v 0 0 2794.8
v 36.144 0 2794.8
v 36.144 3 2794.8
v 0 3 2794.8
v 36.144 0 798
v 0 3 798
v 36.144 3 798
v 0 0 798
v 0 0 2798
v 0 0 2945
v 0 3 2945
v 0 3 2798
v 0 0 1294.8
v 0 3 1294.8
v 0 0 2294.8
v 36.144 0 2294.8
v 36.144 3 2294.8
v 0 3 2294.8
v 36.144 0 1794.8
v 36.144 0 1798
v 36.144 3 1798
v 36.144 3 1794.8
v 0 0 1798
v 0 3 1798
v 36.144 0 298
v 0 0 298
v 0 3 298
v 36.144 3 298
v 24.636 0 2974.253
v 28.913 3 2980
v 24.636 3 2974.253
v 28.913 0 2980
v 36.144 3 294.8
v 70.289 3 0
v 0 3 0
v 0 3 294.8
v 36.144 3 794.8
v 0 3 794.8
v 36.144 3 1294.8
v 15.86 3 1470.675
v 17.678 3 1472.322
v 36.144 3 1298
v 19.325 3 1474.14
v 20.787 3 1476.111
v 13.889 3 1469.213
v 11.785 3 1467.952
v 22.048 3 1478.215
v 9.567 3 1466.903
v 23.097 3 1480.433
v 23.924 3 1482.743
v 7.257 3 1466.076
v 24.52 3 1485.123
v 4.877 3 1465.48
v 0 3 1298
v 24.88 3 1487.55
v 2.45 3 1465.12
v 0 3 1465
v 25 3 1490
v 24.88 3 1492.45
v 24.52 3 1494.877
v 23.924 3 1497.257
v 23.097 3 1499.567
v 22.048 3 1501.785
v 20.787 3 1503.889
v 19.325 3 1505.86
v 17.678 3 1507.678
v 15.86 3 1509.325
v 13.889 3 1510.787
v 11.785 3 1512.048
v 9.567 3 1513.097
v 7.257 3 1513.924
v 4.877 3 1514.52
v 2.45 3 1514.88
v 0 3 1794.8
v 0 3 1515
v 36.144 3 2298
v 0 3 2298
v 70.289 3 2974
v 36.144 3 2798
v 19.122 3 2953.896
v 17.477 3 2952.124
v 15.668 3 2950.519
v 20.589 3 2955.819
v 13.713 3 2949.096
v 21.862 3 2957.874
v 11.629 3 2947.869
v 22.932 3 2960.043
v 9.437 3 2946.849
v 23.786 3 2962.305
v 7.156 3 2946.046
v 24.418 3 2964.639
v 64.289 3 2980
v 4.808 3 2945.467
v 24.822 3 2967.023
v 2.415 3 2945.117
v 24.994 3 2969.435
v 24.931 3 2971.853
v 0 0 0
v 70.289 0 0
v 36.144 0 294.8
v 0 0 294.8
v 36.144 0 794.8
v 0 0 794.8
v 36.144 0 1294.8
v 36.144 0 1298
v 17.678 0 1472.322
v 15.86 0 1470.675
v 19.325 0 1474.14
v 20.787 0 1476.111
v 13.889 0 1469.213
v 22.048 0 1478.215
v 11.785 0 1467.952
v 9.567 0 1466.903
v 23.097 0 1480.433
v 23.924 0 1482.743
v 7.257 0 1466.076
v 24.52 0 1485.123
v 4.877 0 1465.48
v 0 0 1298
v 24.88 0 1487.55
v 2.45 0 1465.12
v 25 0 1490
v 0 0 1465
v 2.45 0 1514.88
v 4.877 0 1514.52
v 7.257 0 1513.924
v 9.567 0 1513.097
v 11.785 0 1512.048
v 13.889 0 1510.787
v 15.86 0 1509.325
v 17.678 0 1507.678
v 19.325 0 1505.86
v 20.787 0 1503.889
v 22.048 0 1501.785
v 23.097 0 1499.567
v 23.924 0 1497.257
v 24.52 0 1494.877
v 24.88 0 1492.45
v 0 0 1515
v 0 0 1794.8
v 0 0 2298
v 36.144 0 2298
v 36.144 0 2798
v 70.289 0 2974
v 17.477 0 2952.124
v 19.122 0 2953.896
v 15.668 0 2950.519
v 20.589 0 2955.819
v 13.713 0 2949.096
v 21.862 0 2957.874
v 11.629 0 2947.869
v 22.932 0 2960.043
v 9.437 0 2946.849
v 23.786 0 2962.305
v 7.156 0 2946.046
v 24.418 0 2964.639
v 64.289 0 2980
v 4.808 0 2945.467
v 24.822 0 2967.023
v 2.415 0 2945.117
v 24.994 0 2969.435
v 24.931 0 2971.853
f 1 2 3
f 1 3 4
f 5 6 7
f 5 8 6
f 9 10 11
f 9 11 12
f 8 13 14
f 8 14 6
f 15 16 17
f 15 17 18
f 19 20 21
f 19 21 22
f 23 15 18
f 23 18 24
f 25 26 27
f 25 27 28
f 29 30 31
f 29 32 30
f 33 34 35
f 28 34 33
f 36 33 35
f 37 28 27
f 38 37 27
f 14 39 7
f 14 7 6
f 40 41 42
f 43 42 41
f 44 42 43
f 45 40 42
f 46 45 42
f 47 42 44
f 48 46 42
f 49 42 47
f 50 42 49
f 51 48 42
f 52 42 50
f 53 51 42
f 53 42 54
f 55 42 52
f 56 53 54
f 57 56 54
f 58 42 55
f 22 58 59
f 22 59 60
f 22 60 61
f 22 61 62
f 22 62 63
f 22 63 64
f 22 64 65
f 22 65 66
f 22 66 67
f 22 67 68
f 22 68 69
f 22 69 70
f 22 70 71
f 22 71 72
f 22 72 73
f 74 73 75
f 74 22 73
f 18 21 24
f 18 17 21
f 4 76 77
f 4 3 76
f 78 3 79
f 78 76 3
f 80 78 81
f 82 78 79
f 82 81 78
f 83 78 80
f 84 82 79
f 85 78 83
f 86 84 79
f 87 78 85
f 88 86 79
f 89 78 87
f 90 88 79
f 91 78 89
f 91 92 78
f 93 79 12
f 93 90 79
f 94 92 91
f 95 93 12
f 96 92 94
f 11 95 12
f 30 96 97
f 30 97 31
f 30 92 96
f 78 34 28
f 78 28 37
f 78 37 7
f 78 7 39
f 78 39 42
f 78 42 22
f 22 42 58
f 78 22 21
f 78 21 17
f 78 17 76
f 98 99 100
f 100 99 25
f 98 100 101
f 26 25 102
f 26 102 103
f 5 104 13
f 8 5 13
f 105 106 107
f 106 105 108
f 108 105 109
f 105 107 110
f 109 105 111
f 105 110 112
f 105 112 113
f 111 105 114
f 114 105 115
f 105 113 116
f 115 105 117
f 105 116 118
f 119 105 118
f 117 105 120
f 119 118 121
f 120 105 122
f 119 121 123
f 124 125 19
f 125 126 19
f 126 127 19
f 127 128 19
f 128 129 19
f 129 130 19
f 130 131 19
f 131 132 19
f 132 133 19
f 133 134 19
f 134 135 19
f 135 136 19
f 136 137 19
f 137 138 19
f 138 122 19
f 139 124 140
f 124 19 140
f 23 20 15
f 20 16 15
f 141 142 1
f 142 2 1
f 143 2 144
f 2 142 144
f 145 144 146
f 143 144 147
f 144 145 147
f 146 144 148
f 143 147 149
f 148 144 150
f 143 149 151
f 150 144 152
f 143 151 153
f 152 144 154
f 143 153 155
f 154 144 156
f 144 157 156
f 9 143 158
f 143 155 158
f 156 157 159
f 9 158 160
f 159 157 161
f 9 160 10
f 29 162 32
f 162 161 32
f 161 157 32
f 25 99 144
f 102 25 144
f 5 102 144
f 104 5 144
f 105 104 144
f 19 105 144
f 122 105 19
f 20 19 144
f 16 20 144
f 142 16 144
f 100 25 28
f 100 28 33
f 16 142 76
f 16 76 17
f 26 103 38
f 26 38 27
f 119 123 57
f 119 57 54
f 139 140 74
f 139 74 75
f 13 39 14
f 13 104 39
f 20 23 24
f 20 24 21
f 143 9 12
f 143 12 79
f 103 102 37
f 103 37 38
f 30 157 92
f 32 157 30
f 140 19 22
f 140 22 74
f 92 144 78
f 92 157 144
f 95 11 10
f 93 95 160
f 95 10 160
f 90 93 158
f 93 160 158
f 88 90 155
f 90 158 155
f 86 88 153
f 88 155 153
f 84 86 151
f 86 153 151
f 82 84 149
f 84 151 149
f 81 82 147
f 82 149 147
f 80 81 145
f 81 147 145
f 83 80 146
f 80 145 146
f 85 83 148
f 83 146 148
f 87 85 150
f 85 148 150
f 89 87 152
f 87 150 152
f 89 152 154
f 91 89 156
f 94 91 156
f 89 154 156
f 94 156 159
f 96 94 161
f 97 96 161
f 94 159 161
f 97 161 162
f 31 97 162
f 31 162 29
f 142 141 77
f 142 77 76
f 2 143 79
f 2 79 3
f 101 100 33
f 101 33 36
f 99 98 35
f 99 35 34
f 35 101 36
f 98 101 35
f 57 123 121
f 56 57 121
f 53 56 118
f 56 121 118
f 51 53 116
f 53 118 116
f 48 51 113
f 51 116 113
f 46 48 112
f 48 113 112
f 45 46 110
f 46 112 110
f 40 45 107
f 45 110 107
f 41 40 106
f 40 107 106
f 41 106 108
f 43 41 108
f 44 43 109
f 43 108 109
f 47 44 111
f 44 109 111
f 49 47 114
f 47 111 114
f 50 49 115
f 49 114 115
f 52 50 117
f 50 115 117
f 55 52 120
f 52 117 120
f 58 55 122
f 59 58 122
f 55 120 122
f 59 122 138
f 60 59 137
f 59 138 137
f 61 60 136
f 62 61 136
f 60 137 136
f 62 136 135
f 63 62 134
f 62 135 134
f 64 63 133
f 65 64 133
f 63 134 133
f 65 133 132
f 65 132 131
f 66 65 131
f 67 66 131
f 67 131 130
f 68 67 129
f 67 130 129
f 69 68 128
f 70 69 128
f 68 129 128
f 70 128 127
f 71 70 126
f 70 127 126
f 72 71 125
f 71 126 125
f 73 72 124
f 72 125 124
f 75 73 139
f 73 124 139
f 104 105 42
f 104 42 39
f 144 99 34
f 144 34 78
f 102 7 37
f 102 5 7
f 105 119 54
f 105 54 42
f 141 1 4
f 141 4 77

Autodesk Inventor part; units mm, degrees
ref_plane "YZ Plane" through (0, 0, 0) normal (1, 0, 0) x (0, 1, 0)
ref_plane "XZ Plane" through (0, 0, 0) normal (0, 1, 0) x (-1, 0, 0)
ref_plane "XY Plane" through (0, 0, 0) normal (0, 0, 1) x (1, 0, 0)
sketch "Sketch6" plane through (0, 0, 0) normal (0, 1, 0) x (-1, 0, 0)
  line L0 (0, 0) -> (-70.2891, 0)
  line L1 (-70.2891, 0) -> (-70.2891, 2980)
  line L2 (-70.2891, 2980) -> (0, 2980)
  line L3 (0, 2980) -> (0, 0)
  dimension "d26" = 70.2891
  dimension "d27" = 2980
extrude "Plate4" add sketch "Sketch6" along normal blind 3
sketch "Sketch9" plane through (0, 3, 0) normal (0, 1, 0) x (1, 0, 0)
  line L0 (0, -2980) -> (0, 0) projected
  line L1 (70.2891, -2980) -> (0, -2980) projected
  line L2 (70.2891, 0) -> (70.2891, -2980) projected
  line L3 (0, 0) -> (70.2891, 0) projected
  line L4 (25, -2762.0797) -> (10, -2762.0797) construction
  line L5 (10, -2762.0797) -> (10, -2562.0797) construction
  line L6 (10, -2562.0797) -> (25, -2562.0797) construction
  line L7 (25, -2562.0797) -> (25, -2762.0797) construction
  dimension "d44" = 200
  dimension "d45" = 15
  dimension "d47" = 10
mark "Mark1"
sketch "Sketch7" plane through (0, 0, 0) normal (0, -1, 0) x (1, 0, 0)
  line L0 (0, 2980) -> (70.2891, 2980) projected
  line L1 (0, 0) -> (0, 2980) projected
  line L2 (70.2891, 0) -> (0, 0) projected
  line L3 (70.2891, 2980) -> (70.2891, 0) projected
  line L4 (0, 2798) -> (36.1445, 2798)
  line L5 (36.1445, 2798) -> (36.1445, 2794.8)
  line L6 (36.1445, 2794.8) -> (0, 2794.8)
  line L7 (0, 2794.8) -> (0, 2798)
  point P0 (0, 2794.8)
  point P1 (0, 200)
  point P2 (46.4173, 200)
  point P3 (0, 2794.8)
  dimension "d29" = 36.1445
  dimension "d30" = 3.2
  dimension "d51" = 182
extrude "Extrusion2" cut sketch "Sketch7" against normal through all contours L4 L5 L6 L1
pattern_linear "Rectangular Pattern1" count 6 spacing 500 along (0, 0, -1) of "Extrusion2"
sketch "Sketch8" plane through (0, 0, 0) normal (0, -1, 0) x (1, 0, 0)
  line L0 (0, 2798) -> (36.1445, 2798) projected
  line L1 (36.1445, 2798) -> (36.1445, 2794.8) projected
  line L2 (36.1445, 2794.8) -> (0, 2794.8) projected
  line L3 (0, 0) -> (0, 294.8) projected
  line L4 (70.2891, 0) -> (0, 0) projected
  line L5 (70.2891, 2980) -> (70.2891, 0) projected
  line L6 (0, 2980) -> (70.2891, 2980) projected
  circle A0 centre (0, 1490) radius 25
  line L7 (0, 2798) -> (0, 2980) projected
  line L8 (0, 298) -> (36.1445, 298) projected
  line L9 (36.1445, 298) -> (36.1445, 294.8) projected
  line L10 (36.1445, 294.8) -> (0, 294.8) projected
  line L11 (0, 2298) -> (0, 2794.8) projected
  line L12 (0, 2298) -> (36.1445, 2298) projected
  line L13 (36.1445, 2298) -> (36.1445, 2294.8) projected
  line L14 (36.1445, 2294.8) -> (0, 2294.8) projected
  line L15 (0, 1798) -> (0, 2294.8) projected
  line L16 (0, 1798) -> (36.1445, 1798) projected
  line L17 (36.1445, 1798) -> (36.1445, 1794.8) projected
  line L18 (36.1445, 1794.8) -> (0, 1794.8) projected
  line L19 (0, 1298) -> (0, 1794.8) projected
  line L20 (0, 1298) -> (36.1445, 1298) projected
  line L21 (36.1445, 1298) -> (36.1445, 1294.8) projected
  line L22 (36.1445, 1294.8) -> (0, 1294.8) projected
  line L23 (0, 798) -> (0, 1294.8) projected
  line L24 (0, 798) -> (36.1445, 798) projected
  line L25 (36.1445, 798) -> (36.1445, 794.8) projected
  line L26 (36.1445, 794.8) -> (0, 794.8) projected
  line L27 (0, 298) -> (0, 794.8) projected
  dimension "d37" = 50
  dimension "d38" = 1490
extrude "Extrusion3" cut sketch "Sketch8" against normal through all contours L19 A0 | A0 L19
pattern_linear "Rectangular Pattern2" count 2 spacing 1480 along (0, 0, 1) of "Extrusion3"
chamfer "Corner Chamfer1" distance 6 angle 45 2 edges at (22.9129, 1.5, 2980) (70.2891, 1.5, 2980)
equation "\"d28\" = Thickness"
equation "\"BendReliefWidth\" = Thickness"
equation "\"BendReliefDepth\" = 0.5 * Thickness"
equation "\"CornerReliefSize\" = 4 * Thickness"
equation "\"MinimumRemnant\" = 2 * Thickness"
equation "\"TransitionRadius\" = BendRadius"
equation "\"JacobiRadiusSize\" = BendRadius"
equation "\"GapSize\" = Thickness"
equation "\"Thickness\" = 3"
equation "\"BendRadius\" = 5"
properties part number "BSH 0351 stringer board 3" material "09g2s"
